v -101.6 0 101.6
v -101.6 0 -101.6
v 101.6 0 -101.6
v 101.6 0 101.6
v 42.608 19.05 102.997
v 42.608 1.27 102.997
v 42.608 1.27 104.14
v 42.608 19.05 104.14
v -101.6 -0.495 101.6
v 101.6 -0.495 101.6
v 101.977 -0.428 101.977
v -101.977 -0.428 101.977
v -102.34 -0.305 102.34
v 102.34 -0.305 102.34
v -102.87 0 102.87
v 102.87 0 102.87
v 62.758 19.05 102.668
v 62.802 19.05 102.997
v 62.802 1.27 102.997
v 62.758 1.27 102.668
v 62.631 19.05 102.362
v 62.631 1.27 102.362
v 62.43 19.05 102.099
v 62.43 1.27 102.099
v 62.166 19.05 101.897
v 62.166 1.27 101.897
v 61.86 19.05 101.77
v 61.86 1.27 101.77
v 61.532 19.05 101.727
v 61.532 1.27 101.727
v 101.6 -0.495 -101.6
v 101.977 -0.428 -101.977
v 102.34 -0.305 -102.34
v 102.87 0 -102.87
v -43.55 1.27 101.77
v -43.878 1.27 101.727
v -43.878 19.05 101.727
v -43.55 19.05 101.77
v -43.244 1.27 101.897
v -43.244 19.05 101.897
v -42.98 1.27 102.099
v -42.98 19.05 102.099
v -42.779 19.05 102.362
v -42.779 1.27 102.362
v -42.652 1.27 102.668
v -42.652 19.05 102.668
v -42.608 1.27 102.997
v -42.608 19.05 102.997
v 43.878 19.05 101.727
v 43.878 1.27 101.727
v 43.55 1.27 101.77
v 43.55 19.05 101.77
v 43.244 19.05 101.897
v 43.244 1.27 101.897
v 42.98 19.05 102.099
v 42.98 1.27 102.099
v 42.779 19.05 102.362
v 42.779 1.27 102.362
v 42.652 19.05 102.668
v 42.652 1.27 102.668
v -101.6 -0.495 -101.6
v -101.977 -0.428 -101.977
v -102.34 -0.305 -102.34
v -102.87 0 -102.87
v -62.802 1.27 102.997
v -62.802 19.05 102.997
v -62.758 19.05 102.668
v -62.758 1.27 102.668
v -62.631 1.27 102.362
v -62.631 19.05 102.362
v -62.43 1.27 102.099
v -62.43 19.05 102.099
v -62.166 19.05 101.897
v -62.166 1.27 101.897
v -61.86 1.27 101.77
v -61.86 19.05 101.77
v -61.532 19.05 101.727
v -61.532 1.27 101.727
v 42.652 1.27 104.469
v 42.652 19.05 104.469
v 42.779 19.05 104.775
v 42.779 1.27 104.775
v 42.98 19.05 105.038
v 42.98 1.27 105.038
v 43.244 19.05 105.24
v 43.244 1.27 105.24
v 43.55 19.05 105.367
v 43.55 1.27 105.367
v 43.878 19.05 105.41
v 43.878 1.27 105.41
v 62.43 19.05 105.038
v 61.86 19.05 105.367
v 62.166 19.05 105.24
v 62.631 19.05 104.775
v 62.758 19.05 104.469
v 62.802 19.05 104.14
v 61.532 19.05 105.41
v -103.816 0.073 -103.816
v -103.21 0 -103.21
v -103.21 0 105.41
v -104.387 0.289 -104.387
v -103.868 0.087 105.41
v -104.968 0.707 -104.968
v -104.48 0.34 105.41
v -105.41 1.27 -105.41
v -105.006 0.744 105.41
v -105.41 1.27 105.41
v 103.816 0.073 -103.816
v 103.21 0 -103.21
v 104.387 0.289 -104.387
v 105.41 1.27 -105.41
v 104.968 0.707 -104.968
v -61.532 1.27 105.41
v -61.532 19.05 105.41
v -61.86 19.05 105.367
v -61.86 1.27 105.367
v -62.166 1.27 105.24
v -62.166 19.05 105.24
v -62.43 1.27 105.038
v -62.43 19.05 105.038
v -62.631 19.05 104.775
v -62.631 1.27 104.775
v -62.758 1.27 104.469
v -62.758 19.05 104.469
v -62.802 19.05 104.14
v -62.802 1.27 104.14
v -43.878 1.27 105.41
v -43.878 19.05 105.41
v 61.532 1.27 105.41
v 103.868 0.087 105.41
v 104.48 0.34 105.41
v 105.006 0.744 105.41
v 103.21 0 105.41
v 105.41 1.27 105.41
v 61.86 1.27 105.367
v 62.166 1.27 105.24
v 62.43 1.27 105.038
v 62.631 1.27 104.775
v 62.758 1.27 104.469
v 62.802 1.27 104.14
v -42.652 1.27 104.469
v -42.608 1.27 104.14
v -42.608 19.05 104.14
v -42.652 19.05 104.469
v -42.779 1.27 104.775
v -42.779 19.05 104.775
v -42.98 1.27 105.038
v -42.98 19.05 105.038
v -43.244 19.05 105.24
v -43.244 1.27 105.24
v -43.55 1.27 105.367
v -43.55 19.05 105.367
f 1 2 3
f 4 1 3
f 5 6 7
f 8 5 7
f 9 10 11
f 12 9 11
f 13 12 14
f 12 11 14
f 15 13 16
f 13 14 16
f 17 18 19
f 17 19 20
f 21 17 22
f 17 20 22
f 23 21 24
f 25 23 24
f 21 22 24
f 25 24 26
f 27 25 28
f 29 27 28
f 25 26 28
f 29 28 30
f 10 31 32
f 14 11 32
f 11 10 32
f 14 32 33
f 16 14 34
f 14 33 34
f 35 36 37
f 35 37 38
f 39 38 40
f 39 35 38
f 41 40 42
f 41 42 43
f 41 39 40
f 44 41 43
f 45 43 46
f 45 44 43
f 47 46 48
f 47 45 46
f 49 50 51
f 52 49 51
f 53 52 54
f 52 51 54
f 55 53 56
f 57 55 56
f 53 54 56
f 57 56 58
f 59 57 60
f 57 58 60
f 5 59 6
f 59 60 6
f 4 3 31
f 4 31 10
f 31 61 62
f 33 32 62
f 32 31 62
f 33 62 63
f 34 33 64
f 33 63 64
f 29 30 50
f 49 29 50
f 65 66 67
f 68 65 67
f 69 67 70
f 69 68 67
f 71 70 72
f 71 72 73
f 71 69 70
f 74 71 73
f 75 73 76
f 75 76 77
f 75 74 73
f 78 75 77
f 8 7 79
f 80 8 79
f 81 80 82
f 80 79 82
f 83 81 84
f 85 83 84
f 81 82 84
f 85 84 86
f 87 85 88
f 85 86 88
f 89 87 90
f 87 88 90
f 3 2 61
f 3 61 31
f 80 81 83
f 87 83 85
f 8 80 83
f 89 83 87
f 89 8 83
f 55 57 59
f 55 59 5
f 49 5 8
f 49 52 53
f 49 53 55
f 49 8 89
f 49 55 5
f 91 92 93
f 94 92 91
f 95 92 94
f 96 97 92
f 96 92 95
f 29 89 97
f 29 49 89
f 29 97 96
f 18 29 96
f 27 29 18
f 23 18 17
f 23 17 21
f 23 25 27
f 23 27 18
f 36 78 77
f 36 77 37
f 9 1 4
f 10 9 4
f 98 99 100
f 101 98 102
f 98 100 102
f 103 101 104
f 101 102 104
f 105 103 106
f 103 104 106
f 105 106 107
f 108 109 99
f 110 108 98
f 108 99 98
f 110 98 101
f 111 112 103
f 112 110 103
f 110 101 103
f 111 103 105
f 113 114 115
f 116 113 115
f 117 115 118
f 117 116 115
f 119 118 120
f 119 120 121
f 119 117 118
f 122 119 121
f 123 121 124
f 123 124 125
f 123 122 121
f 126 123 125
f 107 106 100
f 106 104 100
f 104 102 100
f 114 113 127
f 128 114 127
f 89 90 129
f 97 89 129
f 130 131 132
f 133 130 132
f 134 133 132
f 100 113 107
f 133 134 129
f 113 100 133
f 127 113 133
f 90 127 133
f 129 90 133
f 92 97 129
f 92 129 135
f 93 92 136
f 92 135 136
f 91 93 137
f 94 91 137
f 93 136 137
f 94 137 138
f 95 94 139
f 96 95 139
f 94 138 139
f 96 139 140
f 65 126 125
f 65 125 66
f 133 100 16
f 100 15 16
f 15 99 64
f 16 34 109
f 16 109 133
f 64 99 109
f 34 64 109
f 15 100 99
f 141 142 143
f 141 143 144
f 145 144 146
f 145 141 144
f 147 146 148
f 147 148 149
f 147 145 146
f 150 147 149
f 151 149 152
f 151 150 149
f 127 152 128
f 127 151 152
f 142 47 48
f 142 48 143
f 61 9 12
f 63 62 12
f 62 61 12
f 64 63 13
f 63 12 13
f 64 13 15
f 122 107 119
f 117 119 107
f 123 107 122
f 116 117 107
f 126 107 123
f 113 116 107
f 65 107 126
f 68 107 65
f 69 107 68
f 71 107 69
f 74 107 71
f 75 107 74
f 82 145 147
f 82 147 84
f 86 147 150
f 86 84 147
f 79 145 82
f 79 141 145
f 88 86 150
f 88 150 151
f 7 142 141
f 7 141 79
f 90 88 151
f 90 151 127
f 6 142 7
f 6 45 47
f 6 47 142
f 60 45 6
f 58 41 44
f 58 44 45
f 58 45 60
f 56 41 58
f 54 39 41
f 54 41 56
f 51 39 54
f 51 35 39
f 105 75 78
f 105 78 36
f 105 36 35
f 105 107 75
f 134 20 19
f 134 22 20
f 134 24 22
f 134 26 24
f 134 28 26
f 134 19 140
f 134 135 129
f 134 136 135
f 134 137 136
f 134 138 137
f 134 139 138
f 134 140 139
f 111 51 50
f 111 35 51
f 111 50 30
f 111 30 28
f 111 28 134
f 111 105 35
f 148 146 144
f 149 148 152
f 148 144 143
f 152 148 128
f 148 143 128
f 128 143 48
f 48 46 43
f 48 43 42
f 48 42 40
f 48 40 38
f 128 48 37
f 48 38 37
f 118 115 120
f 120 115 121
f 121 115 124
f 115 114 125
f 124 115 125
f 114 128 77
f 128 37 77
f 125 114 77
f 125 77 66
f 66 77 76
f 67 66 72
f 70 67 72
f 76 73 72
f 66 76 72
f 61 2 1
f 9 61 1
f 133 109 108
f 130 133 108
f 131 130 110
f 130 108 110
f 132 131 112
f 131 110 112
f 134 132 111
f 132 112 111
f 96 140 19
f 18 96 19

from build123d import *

# Parameters (mm, degrees)
SKETCH1_W           = 210.82
SKETCH1_H           = 210.82
BOSS_EXTRUDE1_DEPTH = 1.27
BOSS_EXTRUDE2_DEPTH = 17.78
SKETCH3_W           = 205.74
SKETCH3_H           = 205.74
SKETCH3_W_2         = 203.2
SKETCH3_H_2         = 203.2
BOSS_EXTRUDE3_DEPTH = 0.508
FILLET1_R           = 2.54
FILLET2_R           = 2.54


with BuildPart() as part:
    # Sketch1 → Boss-Extrude1 (new body)
    with BuildSketch(Plane(origin=(0, 0, 0), x_dir=(1, 0, 0), z_dir=(0, 1, 0))):
        Rectangle(SKETCH1_W, SKETCH1_H)
    extrude(amount=BOSS_EXTRUDE1_DEPTH)

    # Sketch2 → Boss-Extrude2 (add)
    with BuildSketch(Plane(origin=(0, 1.27, 0), x_dir=(1, 0, 0), z_dir=(0, 1, 0))):
        with BuildLine():
            Line((42.6085, -102.997), (42.6085, -104.14))
            ThreePointArc((42.6085, -104.14), (42.980474388, -105.038025612), (43.8785, -105.41))
            Line((43.8785, -105.41), (61.5315, -105.41))
            ThreePointArc((61.5315, -105.41), (62.429525612, -105.038025612), (62.8015, -104.14))
            Line((62.8015, -104.14), (62.8015, -102.997))
            ThreePointArc((62.8015, -102.997), (62.429525612, -102.098974388), (61.5315, -101.727))
            Line((61.5315, -101.727), (43.8785, -101.727))
            ThreePointArc((43.8785, -101.727), (42.980474388, -102.098974388), (42.6085, -102.997))
        make_face()
        with BuildLine():
            Line((-61.5315, -101.727), (-43.8785, -101.727))
            ThreePointArc((-43.8785, -101.727), (-42.980474388, -102.098974388), (-42.6085, -102.997))
            Line((-42.6085, -102.997), (-42.6085, -104.14))
            ThreePointArc((-42.6085, -104.14), (-42.980474388, -105.038025612), (-43.8785, -105.41))
            Line((-43.8785, -105.41), (-61.5315, -105.41))
            ThreePointArc((-61.5315, -105.41), (-62.429525612, -105.038025612), (-62.8015, -104.14))
            Line((-62.8015, -104.14), (-62.8015, -102.997))
            ThreePointArc((-62.8015, -102.997), (-62.429525612, -102.098974388), (-61.5315, -101.727))
        make_face()
    extrude(amount=BOSS_EXTRUDE2_DEPTH)

    # Sketch3 → Boss-Extrude3 (add)
    with BuildSketch(Plane.XZ):
        Rectangle(SKETCH3_W, SKETCH3_H)
        Rectangle(SKETCH3_W_2, SKETCH3_H_2, mode=Mode.SUBTRACT)
    extrude(amount=BOSS_EXTRUDE3_DEPTH)

    # Fillet1
    # the kernel refuses this fillet: 2.54 mm, written as the material it takes off along each edge
    with BuildSketch(Plane(origin=(105.41, 0, -110.909261314), x_dir=(0, 1, 0), z_dir=(0, 0, 1)), Plane(origin=(-110.909261314, 0, -105.41), x_dir=(0, 1, 0), z_dir=(1, 0, 0)), Plane(origin=(-105.41, 0, 110.909261314), x_dir=(0, 1, 0), z_dir=(0, 0, -1))) as fillet1_piece_1:
        with BuildLine():
            CenterArc((2.54, 2.199704526), FILLET1_R, 180, 60)
            Line((0, 2.199704526), (-0.0508, 2.199704526))
            Line((-0.0508, 2.199704526), (-0.0508, 0))
            Line((-0.0508, 0), (0, -0.0508))
            ThreePointArc((0, -0.0508), (0.635, -0.0508), (1.2446, -0.043994091))
            Line((1.2446, -0.043994091), (1.27, 0))
        make_face()
    extrude(amount=221.818522628, mode=Mode.SUBTRACT)

    # Fillet2
    # the kernel refuses this fillet: 2.54 mm, written as the material it takes off along each edge
    with BuildSketch(Plane(origin=(106.68, -0.508, 102.87), x_dir=(0, 1, 0), z_dir=(-1, 0, 0)), Plane(origin=(102.87, -0.508, -106.68), x_dir=(0, 1, 0), z_dir=(0, 0, 1)), Plane(origin=(-106.68, -0.508, -102.87), x_dir=(0, 1, 0), z_dir=(1, 0, 0)), Plane(origin=(-102.87, -0.508, 106.68), x_dir=(0, 1, 0), z_dir=(0, 0, -1))) as fillet2_piece_1:
        with BuildLine():
            CenterArc((2.54, 1.524), FILLET2_R, 180, 36.869897646)
            Line((0, 1.524), (-0.0508, 1.524))
            Line((-0.0508, 1.524), (-0.0508, 0))
            Line((-0.0508, 0), (0, -0.0508))
            ThreePointArc((0, -0.0508), (0.254, -0.0508), (0.46736, -0.03048))
            Line((0.46736, -0.03048), (0.508, 0))
        make_face()
    extrude(amount=213.36, mode=Mode.SUBTRACT)


solid = part.part
